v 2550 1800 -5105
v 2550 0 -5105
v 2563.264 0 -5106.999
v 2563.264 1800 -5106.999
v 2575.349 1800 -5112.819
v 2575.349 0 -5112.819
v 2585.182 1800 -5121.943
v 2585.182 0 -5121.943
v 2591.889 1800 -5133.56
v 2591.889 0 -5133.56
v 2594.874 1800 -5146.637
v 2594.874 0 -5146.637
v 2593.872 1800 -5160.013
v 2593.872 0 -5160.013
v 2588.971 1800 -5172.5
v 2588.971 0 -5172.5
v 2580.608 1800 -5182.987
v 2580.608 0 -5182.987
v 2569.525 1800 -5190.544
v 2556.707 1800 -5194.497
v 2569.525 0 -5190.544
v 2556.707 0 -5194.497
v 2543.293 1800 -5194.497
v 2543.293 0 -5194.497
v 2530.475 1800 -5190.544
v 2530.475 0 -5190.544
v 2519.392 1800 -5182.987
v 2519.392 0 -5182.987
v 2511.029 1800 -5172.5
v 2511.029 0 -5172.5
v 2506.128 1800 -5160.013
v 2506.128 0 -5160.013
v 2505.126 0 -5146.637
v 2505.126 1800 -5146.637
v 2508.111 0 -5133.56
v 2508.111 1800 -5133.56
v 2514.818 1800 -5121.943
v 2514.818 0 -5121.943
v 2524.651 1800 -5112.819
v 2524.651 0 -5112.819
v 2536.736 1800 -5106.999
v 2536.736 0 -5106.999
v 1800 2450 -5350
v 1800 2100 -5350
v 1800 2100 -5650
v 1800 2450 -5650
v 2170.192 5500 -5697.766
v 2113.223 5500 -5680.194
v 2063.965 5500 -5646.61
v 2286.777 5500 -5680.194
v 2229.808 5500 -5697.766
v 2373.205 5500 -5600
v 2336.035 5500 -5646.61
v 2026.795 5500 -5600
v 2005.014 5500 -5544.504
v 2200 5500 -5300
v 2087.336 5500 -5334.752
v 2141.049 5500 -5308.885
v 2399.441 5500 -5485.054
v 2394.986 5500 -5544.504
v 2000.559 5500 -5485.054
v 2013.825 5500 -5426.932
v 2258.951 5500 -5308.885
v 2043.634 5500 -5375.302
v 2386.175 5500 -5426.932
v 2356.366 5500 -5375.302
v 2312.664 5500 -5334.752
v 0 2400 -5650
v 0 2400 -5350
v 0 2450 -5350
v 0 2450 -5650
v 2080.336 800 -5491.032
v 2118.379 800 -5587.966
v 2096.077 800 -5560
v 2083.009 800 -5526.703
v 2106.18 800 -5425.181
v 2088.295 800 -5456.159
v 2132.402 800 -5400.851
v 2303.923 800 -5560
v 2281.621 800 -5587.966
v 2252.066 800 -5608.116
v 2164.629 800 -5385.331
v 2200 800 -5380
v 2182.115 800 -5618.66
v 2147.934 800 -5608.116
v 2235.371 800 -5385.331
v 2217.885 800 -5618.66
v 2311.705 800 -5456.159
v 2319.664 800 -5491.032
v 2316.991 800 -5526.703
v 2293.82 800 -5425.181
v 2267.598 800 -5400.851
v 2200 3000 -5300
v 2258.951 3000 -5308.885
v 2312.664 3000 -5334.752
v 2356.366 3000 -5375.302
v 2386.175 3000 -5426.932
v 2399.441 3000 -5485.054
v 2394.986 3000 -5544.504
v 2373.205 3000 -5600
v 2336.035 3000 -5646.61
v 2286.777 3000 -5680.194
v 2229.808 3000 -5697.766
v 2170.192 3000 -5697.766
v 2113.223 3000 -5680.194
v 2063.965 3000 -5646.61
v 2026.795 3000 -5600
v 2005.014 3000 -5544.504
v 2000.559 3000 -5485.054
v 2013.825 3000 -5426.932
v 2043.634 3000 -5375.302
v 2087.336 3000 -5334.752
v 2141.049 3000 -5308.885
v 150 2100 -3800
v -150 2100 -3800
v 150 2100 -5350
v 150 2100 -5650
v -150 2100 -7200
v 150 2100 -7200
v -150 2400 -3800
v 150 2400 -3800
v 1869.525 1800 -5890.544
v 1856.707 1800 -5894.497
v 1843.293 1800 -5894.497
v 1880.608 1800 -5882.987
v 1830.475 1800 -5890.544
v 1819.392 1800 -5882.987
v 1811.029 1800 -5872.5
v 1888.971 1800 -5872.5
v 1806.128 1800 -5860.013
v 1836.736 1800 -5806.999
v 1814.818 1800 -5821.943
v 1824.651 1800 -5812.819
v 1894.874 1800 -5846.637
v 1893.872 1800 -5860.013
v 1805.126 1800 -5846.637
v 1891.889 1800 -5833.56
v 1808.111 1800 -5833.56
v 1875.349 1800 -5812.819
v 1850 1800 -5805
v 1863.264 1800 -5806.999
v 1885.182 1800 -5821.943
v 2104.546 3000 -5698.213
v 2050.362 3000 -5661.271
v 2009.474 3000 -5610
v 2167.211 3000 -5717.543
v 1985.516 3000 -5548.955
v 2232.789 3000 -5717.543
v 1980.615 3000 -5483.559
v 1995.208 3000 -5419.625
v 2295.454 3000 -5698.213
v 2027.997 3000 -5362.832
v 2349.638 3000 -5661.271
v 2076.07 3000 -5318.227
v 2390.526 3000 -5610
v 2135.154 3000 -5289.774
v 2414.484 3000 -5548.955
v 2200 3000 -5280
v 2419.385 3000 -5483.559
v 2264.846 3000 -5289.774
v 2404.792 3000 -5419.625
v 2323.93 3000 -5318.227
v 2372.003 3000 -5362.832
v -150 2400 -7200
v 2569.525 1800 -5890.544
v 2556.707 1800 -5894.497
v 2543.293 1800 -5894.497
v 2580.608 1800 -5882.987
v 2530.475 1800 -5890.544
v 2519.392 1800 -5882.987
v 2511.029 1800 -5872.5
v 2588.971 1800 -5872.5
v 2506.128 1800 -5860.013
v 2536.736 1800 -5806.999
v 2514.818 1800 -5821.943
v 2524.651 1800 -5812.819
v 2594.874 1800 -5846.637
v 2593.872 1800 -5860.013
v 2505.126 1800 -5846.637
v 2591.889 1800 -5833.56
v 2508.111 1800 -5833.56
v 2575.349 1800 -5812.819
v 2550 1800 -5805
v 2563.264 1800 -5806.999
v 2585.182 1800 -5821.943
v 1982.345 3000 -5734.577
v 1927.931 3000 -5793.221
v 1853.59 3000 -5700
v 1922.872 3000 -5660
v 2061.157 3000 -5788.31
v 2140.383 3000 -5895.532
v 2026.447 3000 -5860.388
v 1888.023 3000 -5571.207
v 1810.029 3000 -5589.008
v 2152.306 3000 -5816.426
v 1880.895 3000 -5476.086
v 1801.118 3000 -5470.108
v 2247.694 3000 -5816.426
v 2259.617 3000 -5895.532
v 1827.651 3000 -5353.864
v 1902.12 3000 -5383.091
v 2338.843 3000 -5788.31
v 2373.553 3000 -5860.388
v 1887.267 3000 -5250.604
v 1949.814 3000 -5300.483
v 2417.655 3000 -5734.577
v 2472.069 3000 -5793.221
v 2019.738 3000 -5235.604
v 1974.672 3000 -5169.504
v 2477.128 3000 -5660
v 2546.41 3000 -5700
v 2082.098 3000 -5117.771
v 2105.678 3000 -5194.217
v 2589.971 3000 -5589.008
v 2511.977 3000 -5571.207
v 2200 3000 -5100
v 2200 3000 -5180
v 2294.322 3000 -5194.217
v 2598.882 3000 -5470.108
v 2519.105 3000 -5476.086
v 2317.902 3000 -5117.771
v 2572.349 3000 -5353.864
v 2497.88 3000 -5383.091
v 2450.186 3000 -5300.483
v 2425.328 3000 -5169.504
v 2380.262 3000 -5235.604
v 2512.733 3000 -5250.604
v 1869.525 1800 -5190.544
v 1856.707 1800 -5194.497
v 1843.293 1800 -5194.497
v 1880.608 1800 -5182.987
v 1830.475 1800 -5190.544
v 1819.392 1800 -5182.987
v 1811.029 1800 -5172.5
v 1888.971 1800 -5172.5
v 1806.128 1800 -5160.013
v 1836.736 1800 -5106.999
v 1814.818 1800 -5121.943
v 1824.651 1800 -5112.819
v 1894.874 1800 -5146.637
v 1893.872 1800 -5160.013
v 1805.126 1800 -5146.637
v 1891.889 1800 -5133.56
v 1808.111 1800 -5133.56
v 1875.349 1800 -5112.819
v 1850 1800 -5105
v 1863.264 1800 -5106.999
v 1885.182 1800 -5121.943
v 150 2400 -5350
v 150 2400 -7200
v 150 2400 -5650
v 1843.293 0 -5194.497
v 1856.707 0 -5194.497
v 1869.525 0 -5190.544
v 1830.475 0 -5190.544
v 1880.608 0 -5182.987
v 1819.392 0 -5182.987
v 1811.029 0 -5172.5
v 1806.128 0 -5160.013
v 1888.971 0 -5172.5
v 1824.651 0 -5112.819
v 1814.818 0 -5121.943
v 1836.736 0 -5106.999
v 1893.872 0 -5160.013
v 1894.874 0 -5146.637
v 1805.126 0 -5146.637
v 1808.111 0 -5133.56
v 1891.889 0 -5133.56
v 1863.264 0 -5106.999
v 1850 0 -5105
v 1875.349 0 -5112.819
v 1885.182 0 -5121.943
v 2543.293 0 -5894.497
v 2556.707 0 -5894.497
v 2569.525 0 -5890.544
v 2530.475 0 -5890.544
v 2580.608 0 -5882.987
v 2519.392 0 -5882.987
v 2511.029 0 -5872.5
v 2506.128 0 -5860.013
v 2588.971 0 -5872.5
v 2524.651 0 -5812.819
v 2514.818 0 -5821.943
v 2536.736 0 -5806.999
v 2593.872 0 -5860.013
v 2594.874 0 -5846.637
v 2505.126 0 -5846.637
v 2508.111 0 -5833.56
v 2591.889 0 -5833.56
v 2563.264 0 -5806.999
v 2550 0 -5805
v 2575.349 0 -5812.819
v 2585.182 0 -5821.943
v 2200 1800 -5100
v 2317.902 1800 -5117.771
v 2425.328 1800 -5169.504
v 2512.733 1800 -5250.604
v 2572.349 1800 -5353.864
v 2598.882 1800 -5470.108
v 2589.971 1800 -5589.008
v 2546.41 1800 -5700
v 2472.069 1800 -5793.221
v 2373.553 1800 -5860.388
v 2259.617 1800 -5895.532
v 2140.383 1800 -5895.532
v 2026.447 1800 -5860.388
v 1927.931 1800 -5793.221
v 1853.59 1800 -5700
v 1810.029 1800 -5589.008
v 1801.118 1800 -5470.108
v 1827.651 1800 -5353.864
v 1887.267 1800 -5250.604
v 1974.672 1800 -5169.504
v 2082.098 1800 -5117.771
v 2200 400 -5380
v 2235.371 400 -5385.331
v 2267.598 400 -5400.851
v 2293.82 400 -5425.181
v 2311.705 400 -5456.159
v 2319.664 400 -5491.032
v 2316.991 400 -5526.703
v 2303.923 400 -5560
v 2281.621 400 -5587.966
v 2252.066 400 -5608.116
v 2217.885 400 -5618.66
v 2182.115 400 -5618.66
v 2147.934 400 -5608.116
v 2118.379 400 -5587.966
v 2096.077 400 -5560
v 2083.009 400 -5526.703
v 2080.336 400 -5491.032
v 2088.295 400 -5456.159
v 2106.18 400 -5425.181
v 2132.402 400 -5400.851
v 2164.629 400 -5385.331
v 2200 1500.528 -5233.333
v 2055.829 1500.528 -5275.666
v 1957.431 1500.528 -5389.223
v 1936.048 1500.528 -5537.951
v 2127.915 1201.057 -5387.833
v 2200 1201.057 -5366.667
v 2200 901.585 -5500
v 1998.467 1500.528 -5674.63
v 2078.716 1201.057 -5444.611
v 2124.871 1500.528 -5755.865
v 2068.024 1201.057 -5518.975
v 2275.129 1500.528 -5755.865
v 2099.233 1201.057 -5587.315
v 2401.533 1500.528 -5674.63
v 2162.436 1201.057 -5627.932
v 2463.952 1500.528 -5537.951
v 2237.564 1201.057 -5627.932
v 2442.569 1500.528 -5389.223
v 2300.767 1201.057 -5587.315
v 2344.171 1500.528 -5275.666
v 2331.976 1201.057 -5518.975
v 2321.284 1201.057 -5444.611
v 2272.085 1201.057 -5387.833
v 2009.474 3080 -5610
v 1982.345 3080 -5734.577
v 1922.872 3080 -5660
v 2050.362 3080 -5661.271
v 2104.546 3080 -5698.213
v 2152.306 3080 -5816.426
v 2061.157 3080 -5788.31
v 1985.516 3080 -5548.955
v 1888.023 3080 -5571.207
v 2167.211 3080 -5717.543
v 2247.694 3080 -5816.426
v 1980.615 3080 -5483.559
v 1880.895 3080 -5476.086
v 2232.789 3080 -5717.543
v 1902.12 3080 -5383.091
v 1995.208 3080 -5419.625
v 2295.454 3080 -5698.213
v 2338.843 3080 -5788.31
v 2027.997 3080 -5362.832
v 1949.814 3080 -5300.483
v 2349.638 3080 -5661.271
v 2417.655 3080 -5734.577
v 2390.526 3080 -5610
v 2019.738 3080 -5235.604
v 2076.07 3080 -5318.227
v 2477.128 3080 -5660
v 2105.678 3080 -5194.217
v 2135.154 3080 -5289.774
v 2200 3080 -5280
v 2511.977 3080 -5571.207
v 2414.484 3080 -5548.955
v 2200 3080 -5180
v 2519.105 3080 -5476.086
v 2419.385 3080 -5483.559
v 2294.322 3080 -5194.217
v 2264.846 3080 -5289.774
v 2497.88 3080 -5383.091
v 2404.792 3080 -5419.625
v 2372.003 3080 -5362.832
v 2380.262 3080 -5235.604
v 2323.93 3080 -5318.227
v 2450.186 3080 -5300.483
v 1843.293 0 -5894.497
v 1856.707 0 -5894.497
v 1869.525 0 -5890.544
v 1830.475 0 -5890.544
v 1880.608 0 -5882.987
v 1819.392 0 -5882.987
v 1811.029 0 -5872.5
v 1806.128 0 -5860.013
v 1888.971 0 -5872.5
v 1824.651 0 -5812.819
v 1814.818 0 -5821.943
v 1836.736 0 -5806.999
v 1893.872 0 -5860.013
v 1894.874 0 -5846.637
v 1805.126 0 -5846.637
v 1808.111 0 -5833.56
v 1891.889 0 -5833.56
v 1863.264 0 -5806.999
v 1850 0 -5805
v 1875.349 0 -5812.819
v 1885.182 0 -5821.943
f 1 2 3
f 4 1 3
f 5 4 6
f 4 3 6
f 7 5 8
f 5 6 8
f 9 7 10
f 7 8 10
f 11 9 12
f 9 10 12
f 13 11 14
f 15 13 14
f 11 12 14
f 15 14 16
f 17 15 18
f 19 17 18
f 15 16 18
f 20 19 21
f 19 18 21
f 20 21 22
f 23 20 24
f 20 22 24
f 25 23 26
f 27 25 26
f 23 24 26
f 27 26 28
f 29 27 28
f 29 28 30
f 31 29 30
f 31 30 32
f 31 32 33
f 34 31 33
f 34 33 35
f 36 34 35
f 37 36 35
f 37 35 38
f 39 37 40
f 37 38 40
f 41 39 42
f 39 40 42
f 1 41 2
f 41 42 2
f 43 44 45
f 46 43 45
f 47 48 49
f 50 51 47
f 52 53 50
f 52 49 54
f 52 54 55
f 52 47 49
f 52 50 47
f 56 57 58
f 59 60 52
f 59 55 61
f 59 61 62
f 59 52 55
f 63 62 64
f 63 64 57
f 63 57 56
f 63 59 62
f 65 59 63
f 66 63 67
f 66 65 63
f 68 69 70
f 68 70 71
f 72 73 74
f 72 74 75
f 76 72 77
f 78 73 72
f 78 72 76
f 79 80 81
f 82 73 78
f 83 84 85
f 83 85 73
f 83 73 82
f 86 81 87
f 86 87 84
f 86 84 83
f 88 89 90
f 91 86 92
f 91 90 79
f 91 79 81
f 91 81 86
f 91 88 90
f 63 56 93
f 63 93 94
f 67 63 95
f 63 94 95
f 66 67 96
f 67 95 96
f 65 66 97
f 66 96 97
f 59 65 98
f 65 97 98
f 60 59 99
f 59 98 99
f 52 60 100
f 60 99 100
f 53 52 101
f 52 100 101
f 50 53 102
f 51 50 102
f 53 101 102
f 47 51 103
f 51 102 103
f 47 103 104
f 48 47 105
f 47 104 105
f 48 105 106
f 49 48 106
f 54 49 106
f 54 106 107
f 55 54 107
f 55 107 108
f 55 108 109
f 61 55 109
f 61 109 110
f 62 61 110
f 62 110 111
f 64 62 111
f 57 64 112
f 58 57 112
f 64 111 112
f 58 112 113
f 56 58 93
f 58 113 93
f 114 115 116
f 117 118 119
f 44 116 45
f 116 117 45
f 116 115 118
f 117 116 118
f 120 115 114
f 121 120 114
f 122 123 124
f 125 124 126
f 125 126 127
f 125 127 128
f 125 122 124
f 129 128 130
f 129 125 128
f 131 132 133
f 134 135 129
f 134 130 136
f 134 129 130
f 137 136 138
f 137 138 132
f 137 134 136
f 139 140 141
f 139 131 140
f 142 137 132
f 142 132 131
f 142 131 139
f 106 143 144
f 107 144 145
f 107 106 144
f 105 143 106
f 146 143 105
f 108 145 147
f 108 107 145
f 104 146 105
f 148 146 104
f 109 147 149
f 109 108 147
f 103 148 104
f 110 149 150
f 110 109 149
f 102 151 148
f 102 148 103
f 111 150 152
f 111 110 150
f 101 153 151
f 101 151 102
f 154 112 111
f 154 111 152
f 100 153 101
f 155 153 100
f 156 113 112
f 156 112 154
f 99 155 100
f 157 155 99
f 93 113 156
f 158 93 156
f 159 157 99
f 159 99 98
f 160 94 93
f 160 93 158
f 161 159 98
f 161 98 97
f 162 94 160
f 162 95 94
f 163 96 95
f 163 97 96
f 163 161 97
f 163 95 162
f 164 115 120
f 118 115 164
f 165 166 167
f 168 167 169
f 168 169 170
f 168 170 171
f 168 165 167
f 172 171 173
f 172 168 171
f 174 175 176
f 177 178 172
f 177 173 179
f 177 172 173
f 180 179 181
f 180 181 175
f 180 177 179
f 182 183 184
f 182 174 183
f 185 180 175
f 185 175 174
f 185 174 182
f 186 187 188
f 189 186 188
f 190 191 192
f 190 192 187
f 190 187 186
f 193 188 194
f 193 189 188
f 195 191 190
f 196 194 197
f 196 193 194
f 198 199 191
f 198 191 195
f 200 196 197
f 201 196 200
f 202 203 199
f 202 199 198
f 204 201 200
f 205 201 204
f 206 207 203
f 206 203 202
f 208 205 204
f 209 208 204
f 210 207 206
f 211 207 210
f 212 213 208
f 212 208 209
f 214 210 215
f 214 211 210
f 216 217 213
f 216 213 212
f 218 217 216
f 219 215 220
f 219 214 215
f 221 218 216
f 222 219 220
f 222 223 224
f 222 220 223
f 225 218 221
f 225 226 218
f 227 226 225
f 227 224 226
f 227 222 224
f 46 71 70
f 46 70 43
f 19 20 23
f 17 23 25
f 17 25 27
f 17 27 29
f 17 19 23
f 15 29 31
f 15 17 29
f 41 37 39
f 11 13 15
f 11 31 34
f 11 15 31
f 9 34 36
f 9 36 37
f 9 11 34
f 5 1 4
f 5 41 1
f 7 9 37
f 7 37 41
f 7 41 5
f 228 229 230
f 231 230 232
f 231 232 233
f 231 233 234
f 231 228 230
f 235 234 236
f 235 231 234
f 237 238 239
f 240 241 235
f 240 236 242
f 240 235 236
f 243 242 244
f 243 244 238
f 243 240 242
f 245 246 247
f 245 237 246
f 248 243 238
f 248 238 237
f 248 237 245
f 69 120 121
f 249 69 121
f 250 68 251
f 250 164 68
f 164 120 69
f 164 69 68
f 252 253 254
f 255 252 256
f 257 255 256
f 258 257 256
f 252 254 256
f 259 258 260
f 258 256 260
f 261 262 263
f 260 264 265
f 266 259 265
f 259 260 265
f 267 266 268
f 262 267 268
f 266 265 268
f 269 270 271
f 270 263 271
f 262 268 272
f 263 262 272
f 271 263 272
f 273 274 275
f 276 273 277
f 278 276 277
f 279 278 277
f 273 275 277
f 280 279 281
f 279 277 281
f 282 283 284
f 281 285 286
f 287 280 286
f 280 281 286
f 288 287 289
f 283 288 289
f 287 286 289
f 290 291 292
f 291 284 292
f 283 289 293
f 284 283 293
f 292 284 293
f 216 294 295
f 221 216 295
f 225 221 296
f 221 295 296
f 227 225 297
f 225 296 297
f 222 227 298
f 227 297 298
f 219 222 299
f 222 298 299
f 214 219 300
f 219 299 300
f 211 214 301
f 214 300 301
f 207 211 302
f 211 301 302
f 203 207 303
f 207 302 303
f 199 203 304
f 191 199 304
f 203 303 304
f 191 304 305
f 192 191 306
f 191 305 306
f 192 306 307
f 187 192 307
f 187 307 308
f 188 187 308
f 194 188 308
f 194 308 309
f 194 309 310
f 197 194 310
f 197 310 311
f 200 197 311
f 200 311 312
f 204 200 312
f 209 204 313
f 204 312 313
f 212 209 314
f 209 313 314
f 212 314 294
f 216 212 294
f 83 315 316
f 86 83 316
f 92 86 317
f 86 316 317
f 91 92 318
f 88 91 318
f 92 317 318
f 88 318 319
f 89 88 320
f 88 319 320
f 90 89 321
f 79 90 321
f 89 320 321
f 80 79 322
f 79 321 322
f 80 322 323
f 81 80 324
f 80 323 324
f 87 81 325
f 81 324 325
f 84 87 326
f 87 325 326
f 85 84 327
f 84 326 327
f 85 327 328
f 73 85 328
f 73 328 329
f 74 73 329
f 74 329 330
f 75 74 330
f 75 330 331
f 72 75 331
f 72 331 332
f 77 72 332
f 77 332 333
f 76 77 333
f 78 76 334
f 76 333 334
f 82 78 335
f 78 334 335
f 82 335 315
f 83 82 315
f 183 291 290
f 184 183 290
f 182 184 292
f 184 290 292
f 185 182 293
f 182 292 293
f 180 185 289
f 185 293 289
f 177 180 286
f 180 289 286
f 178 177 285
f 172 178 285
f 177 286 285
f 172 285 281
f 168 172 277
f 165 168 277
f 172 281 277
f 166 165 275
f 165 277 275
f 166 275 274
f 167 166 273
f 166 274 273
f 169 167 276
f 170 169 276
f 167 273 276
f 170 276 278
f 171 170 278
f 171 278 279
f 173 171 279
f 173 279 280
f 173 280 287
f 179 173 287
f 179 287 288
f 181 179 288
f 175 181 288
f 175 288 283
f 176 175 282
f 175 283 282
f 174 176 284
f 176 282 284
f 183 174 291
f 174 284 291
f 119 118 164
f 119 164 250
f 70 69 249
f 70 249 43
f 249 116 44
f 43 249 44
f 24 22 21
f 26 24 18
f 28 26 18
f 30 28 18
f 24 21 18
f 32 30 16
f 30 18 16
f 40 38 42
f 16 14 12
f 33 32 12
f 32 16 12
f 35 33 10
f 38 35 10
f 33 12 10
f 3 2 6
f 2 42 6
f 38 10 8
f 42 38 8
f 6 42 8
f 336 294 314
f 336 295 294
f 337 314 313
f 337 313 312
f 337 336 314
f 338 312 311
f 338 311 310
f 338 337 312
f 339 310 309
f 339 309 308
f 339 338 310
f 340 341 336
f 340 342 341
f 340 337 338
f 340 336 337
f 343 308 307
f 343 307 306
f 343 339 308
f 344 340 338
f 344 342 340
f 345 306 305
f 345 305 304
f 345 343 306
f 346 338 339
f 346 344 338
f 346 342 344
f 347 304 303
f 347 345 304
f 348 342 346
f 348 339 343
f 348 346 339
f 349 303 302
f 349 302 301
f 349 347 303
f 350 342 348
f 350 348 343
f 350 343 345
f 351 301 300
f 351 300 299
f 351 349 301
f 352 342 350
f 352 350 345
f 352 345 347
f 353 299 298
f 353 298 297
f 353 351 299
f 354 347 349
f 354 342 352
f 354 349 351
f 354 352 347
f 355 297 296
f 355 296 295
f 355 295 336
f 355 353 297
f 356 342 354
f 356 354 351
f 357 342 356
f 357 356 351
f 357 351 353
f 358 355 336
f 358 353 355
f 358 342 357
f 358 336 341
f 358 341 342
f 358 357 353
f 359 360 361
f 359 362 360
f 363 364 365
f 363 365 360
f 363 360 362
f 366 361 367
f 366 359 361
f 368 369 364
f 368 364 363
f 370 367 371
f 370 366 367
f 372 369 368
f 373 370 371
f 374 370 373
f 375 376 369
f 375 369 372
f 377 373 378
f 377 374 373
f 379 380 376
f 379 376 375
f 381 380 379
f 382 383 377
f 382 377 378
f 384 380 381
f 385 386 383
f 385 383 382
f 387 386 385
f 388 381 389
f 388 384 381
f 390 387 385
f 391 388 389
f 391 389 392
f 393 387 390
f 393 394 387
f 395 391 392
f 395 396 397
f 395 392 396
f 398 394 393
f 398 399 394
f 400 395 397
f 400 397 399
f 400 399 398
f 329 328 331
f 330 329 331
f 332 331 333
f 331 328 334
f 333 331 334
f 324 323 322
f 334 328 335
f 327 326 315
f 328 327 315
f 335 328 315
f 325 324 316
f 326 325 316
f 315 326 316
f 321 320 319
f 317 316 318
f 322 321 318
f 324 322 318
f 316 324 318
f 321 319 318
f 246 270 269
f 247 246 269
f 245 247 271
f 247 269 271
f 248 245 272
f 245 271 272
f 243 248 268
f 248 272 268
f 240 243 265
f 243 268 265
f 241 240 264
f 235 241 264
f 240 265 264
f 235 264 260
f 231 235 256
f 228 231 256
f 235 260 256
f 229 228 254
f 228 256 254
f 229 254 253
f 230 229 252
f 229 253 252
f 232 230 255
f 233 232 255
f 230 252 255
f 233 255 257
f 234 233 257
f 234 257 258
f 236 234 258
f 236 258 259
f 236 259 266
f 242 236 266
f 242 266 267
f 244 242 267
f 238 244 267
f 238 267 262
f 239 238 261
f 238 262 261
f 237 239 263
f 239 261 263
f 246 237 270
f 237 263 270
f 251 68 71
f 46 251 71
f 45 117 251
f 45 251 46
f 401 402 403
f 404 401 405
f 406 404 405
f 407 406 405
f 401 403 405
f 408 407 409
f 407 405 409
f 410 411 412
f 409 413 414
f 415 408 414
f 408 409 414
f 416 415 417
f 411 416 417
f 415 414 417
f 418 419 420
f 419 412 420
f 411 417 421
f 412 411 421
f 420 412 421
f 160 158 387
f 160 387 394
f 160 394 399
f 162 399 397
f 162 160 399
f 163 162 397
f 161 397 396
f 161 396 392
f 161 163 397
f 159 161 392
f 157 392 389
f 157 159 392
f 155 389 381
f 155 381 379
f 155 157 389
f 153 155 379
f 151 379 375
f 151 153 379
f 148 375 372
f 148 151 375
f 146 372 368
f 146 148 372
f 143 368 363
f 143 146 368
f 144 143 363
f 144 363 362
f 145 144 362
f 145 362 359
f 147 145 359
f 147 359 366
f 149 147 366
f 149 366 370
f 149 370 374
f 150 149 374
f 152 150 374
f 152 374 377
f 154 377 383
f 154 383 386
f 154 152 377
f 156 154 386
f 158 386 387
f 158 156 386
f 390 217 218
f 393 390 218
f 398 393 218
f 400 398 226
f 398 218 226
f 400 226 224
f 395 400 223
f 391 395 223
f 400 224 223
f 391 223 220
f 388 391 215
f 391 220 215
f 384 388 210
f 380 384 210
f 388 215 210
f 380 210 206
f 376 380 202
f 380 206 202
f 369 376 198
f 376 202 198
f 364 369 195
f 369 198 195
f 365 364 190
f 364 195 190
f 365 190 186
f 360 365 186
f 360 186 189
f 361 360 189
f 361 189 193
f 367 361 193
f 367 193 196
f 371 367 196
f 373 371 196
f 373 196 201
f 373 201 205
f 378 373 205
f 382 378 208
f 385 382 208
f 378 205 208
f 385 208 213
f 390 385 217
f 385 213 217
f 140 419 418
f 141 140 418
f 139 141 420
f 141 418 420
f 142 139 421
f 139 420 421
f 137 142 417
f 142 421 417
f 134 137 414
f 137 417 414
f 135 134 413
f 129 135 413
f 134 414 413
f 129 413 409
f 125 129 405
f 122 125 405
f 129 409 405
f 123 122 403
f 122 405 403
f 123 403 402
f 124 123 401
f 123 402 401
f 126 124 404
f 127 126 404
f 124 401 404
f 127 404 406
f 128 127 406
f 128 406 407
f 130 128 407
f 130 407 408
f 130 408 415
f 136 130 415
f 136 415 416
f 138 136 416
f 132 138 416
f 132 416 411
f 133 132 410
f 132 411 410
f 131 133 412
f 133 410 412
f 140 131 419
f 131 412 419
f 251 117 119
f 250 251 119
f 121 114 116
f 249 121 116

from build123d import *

# Parameters (mm, degrees)
SKETCH1_R            = 45
BOSS_EXTRUDE1_DEPTH  = 1800
SKETCH2_R            = 45
BOSS_EXTRUDE2_DEPTH  = 1800
SKETCH3_R            = 45
BOSS_EXTRUDE3_DEPTH  = 1800
SKETCH4_R            = 45
BOSS_EXTRUDE4_DEPTH  = 1800
BOSS_EXTRUDE5_START  = 400
SKETCH5_R            = 120
BOSS_EXTRUDE5_DEPTH  = 400
BOSS_EXTRUDE7_START  = 1800
SKETCH7_R            = 400
BOSS_EXTRUDE7_DEPTH  = 1200
BOSS_EXTRUDE8_START  = 3000
SKETCH8_R            = 200
BOSS_EXTRUDE8_DEPTH  = 2500
BOSS_EXTRUDE9_START  = 3000
SKETCH9_R            = 320
SKETCH9_R_2          = 220
BOSS_EXTRUDE9_DEPTH  = 80
BOSS_EXTRUDE10_START = 2100
SKETCH10_W           = 300
SKETCH10_H           = 3400
BOSS_EXTRUDE10_DEPTH = 300
BOSS_EXTRUDE11_START = 2100
SKETCH11_W           = 1800
SKETCH11_H           = 300
BOSS_EXTRUDE11_DEPTH = 350


with BuildPart() as part:
    # Sketch1 → Boss-Extrude1 (new body)
    with BuildSketch(Plane(origin=(0, 0, 0), x_dir=(1, 0, 0), z_dir=(0, 1, 0))):
        with Locations(Location((1850, 5150, 0), (0, 0, 270))):
            Circle(SKETCH1_R)
    extrude(amount=BOSS_EXTRUDE1_DEPTH)


with BuildPart() as body_2:
    # Sketch2 → Boss-Extrude2 (new body)
    with BuildSketch(Plane(origin=(0, 0, 0), x_dir=(1, 0, 0), z_dir=(0, 1, 0))):
        with Locations(Location((2550, 5150, 0), (0, 0, 270))):
            Circle(SKETCH2_R)
    extrude(amount=BOSS_EXTRUDE2_DEPTH)


with BuildPart() as body_3:
    # Sketch3 → Boss-Extrude3 (new body)
    with BuildSketch(Plane(origin=(0, 0, 0), x_dir=(1, 0, 0), z_dir=(0, 1, 0))):
        with Locations(Location((1850, 5850, 0), (0, 0, 270))):
            Circle(SKETCH3_R)
    extrude(amount=BOSS_EXTRUDE3_DEPTH)


with BuildPart() as body_4:
    # Sketch4 → Boss-Extrude4 (new body)
    with BuildSketch(Plane(origin=(0, 0, 0), x_dir=(1, 0, 0), z_dir=(0, 1, 0))):
        with Locations(Location((2550, 5850, 0), (0, 0, 270))):
            Circle(SKETCH4_R)
    extrude(amount=BOSS_EXTRUDE4_DEPTH)


with BuildPart() as body_5:
    # Sketch5 → Boss-Extrude5 (new body)
    with BuildSketch(Plane(origin=(0, 0, 0), x_dir=(1, 0, 0), z_dir=(0, 1, 0)).offset(BOSS_EXTRUDE5_START)):
        with Locations(Location((2200, 5500, 0), (0, 0, 270))):
            Circle(SKETCH5_R)
    extrude(amount=BOSS_EXTRUDE5_DEPTH)


with BuildPart() as body_6:
    # Boss-Extrude6 cone 1 section (through the dimple's axis) → Boss-Extrude6 (revolve)
    with BuildSketch(Plane(origin=(2200, 1800, -5500), x_dir=(0, 0, 1), z_dir=(1, 0, 0))):
        Polygon((0, 0), (400, 0), (0, 898.414709562), align=None)
    revolve(axis=Axis((2200, 1800, -5500), (0, -1, 0)))

    # Sketch7 → Boss-Extrude7 (add)
    with BuildSketch(Plane(origin=(0, 0, 0), x_dir=(1, 0, 0), z_dir=(0, 1, 0)).offset(BOSS_EXTRUDE7_START)):
        with Locations(Location((2200, 5500, 0), (0, 0, 270))):
            Circle(SKETCH7_R)
    extrude(amount=BOSS_EXTRUDE7_DEPTH)

    # Sketch8 → Boss-Extrude8 (add)
    with BuildSketch(Plane(origin=(0, 0, 0), x_dir=(1, 0, 0), z_dir=(0, 1, 0)).offset(BOSS_EXTRUDE8_START)):
        with Locations(Location((2200, 5500, 0), (0, 0, 270))):
            Circle(SKETCH8_R)
    extrude(amount=BOSS_EXTRUDE8_DEPTH)

    # Sketch9 → Boss-Extrude9 (add)
    with BuildSketch(Plane(origin=(0, 0, 0), x_dir=(1, 0, 0), z_dir=(0, 1, 0)).offset(BOSS_EXTRUDE9_START)):
        with Locations(Location((2200, 5500, 0), (0, 0, 270))):
            Circle(SKETCH9_R)
        with Locations(Location((2200, 5500, 0), (0, 0, 270))):
            Circle(SKETCH9_R_2, mode=Mode.SUBTRACT)
    extrude(amount=BOSS_EXTRUDE9_DEPTH)


with BuildPart() as body_7:
    # Sketch10 → Boss-Extrude10 (new body)
    with BuildSketch(Plane(origin=(0, 0, 0), x_dir=(1, 0, 0), z_dir=(0, 1, 0)).offset(BOSS_EXTRUDE10_START)):
        with Locations((0, 5500)):
            Rectangle(SKETCH10_W, SKETCH10_H)
    extrude(amount=BOSS_EXTRUDE10_DEPTH)

    # Sketch11 → Boss-Extrude11 (add)
    with BuildSketch(Plane(origin=(0, 0, 0), x_dir=(1, 0, 0), z_dir=(0, 1, 0)).offset(BOSS_EXTRUDE11_START)):
        with Locations((900, 5500)):
            Rectangle(SKETCH11_W, SKETCH11_H)
    extrude(amount=BOSS_EXTRUDE11_DEPTH)


solid = Compound([part.part, body_2.part, body_3.part, body_4.part, body_5.part, body_6.part, body_7.part])
